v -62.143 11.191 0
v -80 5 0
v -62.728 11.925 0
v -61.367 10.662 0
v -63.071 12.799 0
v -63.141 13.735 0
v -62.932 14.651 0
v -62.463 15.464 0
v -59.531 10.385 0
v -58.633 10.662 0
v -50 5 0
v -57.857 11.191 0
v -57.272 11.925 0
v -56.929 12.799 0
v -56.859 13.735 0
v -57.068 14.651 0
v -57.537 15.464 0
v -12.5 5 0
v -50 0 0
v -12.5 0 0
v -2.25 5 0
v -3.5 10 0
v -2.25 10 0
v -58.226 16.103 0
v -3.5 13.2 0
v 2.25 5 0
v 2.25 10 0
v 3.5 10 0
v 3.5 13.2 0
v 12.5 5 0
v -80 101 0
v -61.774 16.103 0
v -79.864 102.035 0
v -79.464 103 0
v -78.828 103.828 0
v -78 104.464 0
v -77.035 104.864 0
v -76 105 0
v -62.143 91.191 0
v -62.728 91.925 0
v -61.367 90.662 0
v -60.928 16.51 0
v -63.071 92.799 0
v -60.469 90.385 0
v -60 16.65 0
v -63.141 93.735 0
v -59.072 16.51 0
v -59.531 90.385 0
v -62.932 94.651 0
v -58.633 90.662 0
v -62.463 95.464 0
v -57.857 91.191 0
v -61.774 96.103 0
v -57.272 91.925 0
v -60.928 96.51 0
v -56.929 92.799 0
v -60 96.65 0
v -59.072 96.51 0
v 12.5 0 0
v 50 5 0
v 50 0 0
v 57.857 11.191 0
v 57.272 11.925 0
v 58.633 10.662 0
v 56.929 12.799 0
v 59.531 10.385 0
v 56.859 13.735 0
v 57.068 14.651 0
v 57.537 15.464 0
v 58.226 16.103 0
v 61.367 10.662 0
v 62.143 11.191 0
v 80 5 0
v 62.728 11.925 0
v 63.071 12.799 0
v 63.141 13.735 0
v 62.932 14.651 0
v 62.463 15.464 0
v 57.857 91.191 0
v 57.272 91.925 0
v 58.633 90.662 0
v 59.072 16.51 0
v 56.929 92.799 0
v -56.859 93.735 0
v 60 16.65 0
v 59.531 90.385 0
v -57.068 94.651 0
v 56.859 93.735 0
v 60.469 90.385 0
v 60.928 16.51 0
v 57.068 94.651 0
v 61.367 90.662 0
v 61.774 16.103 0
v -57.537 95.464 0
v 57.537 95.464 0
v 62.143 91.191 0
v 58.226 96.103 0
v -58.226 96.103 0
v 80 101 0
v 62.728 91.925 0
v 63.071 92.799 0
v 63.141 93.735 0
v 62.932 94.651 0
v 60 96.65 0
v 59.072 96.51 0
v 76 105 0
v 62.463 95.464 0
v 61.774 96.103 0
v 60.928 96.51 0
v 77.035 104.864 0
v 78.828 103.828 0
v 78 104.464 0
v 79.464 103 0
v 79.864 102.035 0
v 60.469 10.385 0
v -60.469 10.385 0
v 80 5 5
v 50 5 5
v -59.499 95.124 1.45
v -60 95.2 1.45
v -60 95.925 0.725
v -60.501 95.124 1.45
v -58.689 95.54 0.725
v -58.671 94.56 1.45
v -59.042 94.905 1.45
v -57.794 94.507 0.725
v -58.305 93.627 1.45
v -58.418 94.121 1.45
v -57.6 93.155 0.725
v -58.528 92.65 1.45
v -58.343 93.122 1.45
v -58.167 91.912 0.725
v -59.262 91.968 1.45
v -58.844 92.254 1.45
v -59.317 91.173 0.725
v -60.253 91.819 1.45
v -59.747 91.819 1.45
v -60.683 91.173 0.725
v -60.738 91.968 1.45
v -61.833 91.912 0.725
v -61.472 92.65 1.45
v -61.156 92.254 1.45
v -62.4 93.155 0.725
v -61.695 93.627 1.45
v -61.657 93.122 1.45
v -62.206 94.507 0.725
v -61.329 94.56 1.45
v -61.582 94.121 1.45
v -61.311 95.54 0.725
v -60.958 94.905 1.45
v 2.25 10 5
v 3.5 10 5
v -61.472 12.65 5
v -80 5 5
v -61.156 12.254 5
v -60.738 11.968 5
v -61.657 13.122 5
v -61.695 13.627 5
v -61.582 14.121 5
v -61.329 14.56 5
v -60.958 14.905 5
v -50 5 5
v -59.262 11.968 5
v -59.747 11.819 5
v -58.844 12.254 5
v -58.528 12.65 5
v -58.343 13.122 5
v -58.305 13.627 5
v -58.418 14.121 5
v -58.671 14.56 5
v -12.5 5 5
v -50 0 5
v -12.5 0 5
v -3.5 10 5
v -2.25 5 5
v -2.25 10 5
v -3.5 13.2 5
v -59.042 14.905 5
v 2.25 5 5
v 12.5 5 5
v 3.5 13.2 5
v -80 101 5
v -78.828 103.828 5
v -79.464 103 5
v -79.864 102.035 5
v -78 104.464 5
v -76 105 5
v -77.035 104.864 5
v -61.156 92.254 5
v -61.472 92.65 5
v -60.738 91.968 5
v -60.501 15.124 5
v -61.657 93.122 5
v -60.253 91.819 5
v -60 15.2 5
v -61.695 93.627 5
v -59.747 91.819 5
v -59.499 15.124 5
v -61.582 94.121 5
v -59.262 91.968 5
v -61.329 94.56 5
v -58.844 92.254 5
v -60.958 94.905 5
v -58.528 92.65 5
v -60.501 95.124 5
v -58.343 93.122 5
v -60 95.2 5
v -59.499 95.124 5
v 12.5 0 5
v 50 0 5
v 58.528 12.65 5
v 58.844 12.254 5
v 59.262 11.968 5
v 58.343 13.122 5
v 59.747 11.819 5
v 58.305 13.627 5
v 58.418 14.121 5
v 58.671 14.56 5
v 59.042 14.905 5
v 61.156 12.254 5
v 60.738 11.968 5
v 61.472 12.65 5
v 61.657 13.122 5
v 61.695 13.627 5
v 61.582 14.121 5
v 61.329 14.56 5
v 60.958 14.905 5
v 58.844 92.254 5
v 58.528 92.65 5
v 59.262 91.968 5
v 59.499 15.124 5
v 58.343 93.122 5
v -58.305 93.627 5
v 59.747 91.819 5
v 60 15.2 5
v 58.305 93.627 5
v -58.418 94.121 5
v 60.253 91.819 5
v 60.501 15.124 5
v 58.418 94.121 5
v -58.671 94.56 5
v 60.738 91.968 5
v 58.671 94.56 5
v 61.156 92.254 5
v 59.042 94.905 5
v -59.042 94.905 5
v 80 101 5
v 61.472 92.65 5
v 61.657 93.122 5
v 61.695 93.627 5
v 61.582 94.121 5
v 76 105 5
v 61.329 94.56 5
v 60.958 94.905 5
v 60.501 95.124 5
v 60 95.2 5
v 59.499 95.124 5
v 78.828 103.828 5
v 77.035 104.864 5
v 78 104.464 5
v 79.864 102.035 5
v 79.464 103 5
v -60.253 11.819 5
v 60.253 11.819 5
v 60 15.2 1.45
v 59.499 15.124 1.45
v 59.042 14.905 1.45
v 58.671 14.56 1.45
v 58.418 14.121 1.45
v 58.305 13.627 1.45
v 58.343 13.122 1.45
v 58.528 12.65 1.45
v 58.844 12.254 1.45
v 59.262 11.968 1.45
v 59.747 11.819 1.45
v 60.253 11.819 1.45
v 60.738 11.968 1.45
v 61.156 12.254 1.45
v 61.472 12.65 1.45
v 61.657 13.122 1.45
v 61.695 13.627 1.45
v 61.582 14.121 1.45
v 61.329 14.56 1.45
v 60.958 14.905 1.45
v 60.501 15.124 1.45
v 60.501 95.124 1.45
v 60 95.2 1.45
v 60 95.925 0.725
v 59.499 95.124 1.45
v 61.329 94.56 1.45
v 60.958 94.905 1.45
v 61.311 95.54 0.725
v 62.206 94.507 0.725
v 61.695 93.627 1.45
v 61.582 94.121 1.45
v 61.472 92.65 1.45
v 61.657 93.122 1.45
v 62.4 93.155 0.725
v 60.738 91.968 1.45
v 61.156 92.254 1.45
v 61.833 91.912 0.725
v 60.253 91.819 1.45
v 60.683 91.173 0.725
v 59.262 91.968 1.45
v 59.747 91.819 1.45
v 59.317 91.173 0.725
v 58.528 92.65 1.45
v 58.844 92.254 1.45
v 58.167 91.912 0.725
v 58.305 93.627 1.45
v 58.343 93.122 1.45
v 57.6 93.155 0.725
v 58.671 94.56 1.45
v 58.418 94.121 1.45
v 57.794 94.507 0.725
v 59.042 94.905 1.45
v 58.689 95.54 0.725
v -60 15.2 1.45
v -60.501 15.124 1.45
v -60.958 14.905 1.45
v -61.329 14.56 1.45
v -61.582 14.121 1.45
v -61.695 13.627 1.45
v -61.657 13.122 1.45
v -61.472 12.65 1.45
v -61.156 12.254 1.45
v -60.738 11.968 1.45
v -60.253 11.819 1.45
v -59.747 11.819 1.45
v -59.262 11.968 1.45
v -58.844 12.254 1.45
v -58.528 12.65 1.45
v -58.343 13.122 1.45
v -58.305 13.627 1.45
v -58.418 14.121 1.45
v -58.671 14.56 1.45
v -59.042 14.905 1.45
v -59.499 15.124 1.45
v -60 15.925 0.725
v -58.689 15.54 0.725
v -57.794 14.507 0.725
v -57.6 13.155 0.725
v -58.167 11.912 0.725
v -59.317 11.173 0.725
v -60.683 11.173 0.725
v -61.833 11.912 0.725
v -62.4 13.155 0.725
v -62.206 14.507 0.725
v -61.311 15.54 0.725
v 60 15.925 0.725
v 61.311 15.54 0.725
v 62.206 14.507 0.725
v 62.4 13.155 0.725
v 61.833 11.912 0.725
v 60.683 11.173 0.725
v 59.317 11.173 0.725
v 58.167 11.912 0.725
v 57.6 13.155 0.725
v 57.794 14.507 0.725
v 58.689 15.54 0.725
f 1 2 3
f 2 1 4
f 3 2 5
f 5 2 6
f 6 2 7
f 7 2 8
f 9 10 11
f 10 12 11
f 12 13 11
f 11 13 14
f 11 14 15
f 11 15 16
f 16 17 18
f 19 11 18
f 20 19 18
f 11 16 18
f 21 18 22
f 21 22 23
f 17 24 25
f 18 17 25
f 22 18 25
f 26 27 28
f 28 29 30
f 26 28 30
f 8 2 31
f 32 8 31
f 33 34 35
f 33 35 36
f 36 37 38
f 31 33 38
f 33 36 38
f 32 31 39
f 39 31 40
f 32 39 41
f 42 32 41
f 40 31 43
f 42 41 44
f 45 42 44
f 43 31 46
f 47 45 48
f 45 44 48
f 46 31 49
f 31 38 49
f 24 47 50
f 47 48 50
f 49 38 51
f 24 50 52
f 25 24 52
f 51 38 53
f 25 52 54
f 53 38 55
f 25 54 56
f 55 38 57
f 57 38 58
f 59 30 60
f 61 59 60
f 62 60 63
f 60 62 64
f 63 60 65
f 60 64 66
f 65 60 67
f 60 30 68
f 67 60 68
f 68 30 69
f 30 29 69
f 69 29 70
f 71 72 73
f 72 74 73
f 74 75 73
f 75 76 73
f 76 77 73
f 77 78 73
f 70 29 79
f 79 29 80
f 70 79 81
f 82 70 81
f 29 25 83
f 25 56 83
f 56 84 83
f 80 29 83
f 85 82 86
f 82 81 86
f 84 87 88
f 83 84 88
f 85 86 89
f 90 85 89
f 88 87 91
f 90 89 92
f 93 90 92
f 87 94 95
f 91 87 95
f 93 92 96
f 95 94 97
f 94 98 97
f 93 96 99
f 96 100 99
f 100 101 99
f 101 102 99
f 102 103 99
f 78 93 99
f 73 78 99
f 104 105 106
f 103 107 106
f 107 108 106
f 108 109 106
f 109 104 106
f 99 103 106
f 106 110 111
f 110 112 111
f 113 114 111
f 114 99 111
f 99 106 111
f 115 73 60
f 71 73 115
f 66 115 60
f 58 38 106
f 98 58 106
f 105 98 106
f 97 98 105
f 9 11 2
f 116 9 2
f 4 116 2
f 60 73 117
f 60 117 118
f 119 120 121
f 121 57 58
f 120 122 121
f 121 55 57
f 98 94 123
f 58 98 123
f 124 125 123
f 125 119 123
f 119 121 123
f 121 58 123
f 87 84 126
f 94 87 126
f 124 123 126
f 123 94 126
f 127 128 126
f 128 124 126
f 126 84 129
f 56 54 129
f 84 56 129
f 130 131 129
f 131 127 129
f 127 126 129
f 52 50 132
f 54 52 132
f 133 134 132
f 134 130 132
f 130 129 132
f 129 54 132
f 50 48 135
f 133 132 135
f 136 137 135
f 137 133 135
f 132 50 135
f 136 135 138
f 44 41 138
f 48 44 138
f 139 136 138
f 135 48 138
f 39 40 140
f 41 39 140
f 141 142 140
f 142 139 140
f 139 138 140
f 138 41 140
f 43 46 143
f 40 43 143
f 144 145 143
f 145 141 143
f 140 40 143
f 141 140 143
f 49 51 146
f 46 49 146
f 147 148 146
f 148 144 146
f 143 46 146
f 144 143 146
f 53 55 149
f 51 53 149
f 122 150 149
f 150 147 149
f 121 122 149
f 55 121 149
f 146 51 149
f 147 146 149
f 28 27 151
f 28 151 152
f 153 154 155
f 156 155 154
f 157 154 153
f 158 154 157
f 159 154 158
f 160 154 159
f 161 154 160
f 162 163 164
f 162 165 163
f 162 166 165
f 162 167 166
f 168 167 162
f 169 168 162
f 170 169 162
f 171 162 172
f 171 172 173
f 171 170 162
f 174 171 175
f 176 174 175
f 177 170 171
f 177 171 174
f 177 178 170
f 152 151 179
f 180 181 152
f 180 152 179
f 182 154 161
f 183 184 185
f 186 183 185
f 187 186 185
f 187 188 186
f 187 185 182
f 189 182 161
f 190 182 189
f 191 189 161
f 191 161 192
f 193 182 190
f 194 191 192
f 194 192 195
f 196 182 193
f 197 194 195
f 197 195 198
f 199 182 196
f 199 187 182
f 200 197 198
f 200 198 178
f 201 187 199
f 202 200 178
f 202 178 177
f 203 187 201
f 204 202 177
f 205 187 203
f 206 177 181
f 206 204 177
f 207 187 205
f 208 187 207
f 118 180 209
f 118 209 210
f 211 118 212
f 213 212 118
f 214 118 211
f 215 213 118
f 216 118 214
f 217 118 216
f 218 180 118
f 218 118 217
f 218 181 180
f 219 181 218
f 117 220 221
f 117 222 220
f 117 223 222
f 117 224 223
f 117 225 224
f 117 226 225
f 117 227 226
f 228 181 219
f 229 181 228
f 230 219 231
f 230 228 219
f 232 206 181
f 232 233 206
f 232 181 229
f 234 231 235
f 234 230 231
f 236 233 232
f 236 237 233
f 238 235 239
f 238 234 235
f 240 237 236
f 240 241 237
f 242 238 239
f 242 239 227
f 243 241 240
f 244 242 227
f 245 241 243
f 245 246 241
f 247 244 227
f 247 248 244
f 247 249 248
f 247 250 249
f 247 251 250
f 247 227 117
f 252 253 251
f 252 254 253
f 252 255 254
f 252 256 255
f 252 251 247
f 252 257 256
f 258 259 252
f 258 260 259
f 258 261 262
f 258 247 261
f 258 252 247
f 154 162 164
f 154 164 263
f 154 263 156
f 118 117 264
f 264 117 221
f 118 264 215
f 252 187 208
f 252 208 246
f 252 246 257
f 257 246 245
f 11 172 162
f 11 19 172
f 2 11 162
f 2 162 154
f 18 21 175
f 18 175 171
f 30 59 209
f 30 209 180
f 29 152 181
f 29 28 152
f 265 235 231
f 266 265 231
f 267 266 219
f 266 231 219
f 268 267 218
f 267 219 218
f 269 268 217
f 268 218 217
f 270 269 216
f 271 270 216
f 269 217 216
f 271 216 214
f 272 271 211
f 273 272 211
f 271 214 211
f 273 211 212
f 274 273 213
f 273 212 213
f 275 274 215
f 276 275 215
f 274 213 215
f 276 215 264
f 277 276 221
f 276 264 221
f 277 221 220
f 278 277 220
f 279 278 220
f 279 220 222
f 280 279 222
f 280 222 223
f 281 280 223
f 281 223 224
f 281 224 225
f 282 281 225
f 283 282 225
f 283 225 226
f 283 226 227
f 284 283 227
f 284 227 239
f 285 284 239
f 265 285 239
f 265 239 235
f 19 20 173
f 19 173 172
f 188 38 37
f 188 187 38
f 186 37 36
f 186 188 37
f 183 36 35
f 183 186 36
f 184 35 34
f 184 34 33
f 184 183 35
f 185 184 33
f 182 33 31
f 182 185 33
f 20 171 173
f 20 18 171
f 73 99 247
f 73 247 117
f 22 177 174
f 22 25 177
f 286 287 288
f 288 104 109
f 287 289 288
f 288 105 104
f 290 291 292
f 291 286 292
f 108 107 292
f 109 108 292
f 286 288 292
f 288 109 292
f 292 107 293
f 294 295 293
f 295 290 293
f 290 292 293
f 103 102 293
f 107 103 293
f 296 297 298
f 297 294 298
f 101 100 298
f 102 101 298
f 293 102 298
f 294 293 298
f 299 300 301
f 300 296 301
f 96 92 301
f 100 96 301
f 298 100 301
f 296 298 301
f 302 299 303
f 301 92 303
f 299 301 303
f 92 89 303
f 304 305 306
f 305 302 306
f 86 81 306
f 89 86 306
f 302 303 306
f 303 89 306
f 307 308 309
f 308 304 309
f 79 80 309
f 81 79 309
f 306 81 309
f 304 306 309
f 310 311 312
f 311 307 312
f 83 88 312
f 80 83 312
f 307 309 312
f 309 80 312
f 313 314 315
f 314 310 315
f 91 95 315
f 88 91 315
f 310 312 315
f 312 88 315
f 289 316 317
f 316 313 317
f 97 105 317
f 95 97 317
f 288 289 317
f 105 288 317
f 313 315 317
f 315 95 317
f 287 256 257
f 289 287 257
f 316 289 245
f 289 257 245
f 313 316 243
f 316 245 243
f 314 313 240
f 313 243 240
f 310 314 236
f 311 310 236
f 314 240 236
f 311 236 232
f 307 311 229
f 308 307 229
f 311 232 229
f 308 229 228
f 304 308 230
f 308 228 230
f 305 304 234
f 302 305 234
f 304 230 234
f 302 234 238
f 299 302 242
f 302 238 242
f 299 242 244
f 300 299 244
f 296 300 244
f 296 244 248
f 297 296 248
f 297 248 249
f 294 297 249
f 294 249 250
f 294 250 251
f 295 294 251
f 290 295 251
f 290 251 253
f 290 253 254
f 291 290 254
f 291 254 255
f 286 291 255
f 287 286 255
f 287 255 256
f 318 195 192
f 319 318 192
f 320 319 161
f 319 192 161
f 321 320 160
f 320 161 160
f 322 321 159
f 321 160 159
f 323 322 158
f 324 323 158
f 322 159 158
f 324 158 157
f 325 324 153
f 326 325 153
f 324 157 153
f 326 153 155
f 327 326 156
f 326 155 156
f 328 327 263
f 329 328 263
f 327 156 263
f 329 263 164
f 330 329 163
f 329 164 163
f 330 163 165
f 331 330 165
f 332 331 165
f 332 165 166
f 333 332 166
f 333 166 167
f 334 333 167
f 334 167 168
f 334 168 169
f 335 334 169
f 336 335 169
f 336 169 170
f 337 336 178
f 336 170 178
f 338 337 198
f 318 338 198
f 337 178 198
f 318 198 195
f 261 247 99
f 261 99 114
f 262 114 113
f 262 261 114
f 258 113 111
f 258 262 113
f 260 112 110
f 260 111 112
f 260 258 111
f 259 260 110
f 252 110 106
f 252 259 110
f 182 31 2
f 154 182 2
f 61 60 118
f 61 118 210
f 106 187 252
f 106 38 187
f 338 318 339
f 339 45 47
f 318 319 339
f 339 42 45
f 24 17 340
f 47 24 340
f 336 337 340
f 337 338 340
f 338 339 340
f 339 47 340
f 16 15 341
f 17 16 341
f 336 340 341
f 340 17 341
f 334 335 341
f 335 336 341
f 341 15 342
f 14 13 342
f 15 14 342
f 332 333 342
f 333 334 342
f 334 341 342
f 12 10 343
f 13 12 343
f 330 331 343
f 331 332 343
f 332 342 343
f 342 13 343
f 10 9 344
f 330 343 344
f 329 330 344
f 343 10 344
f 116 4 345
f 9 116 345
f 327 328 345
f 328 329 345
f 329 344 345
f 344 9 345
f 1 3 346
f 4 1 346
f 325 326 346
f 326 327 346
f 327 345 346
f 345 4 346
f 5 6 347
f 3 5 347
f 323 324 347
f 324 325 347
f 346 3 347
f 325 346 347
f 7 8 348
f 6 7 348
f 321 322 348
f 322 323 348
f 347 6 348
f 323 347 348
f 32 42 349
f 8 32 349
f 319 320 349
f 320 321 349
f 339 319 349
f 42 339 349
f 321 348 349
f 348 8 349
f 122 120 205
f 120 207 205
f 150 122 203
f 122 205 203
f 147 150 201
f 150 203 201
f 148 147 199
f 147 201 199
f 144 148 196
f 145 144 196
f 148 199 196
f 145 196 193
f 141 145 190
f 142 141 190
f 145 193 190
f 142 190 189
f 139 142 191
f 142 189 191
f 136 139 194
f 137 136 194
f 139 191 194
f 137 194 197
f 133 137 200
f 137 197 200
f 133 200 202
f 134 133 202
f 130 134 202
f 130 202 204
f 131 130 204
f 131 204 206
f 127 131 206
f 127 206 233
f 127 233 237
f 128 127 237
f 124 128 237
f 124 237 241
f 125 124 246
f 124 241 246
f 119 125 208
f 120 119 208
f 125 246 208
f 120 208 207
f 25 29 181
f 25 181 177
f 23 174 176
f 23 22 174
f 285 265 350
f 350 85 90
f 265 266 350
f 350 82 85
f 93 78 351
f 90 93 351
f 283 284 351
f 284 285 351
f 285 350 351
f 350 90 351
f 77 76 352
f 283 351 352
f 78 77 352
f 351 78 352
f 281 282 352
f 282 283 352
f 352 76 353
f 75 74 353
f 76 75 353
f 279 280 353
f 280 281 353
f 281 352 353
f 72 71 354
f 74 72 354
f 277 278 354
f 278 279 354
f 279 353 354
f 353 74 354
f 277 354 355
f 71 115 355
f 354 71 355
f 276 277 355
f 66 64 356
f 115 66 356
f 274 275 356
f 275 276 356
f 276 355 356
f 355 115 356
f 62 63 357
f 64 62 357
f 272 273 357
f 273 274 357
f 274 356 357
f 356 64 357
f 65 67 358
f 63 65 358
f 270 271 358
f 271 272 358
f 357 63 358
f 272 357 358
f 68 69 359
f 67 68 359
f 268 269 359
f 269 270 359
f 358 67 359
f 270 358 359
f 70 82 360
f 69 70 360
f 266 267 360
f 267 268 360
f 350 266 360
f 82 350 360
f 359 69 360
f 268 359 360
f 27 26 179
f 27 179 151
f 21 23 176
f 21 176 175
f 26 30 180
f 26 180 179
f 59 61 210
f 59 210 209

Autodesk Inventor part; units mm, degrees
ref_plane "YZ Plane" through (0, 0, 0) normal (1, 0, 0) x (0, 1, 0)
ref_plane "XZ Plane" through (0, 0, 0) normal (0, 1, 0) x (-1, 0, 0)
ref_plane "XY Plane" through (0, 0, 0) normal (0, 0, 1) x (1, 0, 0)
sketch "Sketch1" plane through (0, 0, 0) normal (0, 0, 1) x (1, 0, 0)
  line L0 (-80, 105) -> (80, 105)
  line L1 (80, 105) -> (80, 5)
  line L2 (80, 5) -> (50, 5)
  line L3 (50, 5) -> (50, 0)
  line L4 (-50, 0) -> (-50, 5)
  line L5 (-50, 5) -> (-80, 5)
  line L6 (-80, 105) -> (-80, 5)
  line L7 (50, 0) -> (12.5, 0)
  line L8 (12.5, 0) -> (12.5, 5)
  line L9 (12.5, 5) -> (-12.5, 5)
  line L10 (-12.5, 5) -> (-12.5, 0)
  line L11 (-12.5, 0) -> (-50, 0)
  point P0 (0, 0)
  point P1 (0, 105)
  point P2 (0, 0)
  point P3 (0, 5)
  dimension "d0" = 5
  dimension "d1" = 100
  dimension "d2" = 160
  dimension "d3" = 100
  dimension "d22" = 5
  dimension "d23" = 25
  dimension "d24" = 5
  dimension "d25" = 30
extrude "Extrusion1" add sketch "Sketch1" along normal blind 5
sketch "Sketch3" plane through (0, 0, 0) normal (0, 0, -1) x (-1, 0, 0)
  line L0 (60, 13.5) -> (-60, 13.5) construction
  line L1 (-60, 13.5) -> (-60, 93.5) construction
  line L2 (-60, 93.5) -> (60, 93.5) construction
  line L3 (60, 93.5) -> (60, 13.5) construction
  line L4 (60, 13.5) -> (-60, 93.5) construction
  line L5 (-60, 13.5) -> (60, 93.5) construction
  line L6 (80, 5) -> (50, 5) projected
  point P0 (0, 0)
  point P1 (60, 93.5)
  point P2 (0, 53.5)
  point P3 (0, 93.5)
  dimension "d32" = 120
  dimension "d33" = 8.5
  dimension "d34" = 80
hole "Hole1" at (60, 93.5, 0) at (-60, 93.5, 0) at (60, 13.5, 0) at (-60, 13.5, 0) direction (0, 0, 1) diameter 3.4 depth 8 tip angle 118 countersink diameter 6.3 countersink angle 90 clearance for "Countersunk Flat Head Screw DIN EN ISO 2009" size "M3" standard "DIN"
fillet "Fillet1" radius 4 2 edges at (80, 105, 2.5) (-80, 105, 2.5)
sketch "Sketch5" plane through (0, 0, 0) normal (0, 0, -1) x (-1, 0, 0)
  line L0 (-2.25, 5) -> (-2.25, 10)
  line L1 (-2.25, 10) -> (-3.5, 10)
  line L2 (-3.5, 10) -> (-3.5, 13.2)
  line L3 (-3.5, 13.2) -> (3.5, 13.2)
  line L4 (3.5, 13.2) -> (3.5, 10)
  line L5 (3.5, 10) -> (2.25, 10)
  line L6 (2.25, 10) -> (2.25, 5)
  line L7 (-12.5, 5) -> (12.5, 5) projected
  line L8 (-2.25, 5) -> (2.25, 5)
  point P0 (0, 0)
  point P1 (0, 13.2)
  point P2 (0, 5)
  point P3 (0, 5)
  dimension "d26" = 7
  dimension "d27" = 3.2
  dimension "d28" = 5
  dimension "d29" = 4.5
extrude "Extrusion3" cut sketch "Sketch5" against normal blind 5
equation "\"d25\" = -0.5 * d1 + 0.5 * d2"
properties part number "LogicHolder" material "Polycarbonate, Clear"
